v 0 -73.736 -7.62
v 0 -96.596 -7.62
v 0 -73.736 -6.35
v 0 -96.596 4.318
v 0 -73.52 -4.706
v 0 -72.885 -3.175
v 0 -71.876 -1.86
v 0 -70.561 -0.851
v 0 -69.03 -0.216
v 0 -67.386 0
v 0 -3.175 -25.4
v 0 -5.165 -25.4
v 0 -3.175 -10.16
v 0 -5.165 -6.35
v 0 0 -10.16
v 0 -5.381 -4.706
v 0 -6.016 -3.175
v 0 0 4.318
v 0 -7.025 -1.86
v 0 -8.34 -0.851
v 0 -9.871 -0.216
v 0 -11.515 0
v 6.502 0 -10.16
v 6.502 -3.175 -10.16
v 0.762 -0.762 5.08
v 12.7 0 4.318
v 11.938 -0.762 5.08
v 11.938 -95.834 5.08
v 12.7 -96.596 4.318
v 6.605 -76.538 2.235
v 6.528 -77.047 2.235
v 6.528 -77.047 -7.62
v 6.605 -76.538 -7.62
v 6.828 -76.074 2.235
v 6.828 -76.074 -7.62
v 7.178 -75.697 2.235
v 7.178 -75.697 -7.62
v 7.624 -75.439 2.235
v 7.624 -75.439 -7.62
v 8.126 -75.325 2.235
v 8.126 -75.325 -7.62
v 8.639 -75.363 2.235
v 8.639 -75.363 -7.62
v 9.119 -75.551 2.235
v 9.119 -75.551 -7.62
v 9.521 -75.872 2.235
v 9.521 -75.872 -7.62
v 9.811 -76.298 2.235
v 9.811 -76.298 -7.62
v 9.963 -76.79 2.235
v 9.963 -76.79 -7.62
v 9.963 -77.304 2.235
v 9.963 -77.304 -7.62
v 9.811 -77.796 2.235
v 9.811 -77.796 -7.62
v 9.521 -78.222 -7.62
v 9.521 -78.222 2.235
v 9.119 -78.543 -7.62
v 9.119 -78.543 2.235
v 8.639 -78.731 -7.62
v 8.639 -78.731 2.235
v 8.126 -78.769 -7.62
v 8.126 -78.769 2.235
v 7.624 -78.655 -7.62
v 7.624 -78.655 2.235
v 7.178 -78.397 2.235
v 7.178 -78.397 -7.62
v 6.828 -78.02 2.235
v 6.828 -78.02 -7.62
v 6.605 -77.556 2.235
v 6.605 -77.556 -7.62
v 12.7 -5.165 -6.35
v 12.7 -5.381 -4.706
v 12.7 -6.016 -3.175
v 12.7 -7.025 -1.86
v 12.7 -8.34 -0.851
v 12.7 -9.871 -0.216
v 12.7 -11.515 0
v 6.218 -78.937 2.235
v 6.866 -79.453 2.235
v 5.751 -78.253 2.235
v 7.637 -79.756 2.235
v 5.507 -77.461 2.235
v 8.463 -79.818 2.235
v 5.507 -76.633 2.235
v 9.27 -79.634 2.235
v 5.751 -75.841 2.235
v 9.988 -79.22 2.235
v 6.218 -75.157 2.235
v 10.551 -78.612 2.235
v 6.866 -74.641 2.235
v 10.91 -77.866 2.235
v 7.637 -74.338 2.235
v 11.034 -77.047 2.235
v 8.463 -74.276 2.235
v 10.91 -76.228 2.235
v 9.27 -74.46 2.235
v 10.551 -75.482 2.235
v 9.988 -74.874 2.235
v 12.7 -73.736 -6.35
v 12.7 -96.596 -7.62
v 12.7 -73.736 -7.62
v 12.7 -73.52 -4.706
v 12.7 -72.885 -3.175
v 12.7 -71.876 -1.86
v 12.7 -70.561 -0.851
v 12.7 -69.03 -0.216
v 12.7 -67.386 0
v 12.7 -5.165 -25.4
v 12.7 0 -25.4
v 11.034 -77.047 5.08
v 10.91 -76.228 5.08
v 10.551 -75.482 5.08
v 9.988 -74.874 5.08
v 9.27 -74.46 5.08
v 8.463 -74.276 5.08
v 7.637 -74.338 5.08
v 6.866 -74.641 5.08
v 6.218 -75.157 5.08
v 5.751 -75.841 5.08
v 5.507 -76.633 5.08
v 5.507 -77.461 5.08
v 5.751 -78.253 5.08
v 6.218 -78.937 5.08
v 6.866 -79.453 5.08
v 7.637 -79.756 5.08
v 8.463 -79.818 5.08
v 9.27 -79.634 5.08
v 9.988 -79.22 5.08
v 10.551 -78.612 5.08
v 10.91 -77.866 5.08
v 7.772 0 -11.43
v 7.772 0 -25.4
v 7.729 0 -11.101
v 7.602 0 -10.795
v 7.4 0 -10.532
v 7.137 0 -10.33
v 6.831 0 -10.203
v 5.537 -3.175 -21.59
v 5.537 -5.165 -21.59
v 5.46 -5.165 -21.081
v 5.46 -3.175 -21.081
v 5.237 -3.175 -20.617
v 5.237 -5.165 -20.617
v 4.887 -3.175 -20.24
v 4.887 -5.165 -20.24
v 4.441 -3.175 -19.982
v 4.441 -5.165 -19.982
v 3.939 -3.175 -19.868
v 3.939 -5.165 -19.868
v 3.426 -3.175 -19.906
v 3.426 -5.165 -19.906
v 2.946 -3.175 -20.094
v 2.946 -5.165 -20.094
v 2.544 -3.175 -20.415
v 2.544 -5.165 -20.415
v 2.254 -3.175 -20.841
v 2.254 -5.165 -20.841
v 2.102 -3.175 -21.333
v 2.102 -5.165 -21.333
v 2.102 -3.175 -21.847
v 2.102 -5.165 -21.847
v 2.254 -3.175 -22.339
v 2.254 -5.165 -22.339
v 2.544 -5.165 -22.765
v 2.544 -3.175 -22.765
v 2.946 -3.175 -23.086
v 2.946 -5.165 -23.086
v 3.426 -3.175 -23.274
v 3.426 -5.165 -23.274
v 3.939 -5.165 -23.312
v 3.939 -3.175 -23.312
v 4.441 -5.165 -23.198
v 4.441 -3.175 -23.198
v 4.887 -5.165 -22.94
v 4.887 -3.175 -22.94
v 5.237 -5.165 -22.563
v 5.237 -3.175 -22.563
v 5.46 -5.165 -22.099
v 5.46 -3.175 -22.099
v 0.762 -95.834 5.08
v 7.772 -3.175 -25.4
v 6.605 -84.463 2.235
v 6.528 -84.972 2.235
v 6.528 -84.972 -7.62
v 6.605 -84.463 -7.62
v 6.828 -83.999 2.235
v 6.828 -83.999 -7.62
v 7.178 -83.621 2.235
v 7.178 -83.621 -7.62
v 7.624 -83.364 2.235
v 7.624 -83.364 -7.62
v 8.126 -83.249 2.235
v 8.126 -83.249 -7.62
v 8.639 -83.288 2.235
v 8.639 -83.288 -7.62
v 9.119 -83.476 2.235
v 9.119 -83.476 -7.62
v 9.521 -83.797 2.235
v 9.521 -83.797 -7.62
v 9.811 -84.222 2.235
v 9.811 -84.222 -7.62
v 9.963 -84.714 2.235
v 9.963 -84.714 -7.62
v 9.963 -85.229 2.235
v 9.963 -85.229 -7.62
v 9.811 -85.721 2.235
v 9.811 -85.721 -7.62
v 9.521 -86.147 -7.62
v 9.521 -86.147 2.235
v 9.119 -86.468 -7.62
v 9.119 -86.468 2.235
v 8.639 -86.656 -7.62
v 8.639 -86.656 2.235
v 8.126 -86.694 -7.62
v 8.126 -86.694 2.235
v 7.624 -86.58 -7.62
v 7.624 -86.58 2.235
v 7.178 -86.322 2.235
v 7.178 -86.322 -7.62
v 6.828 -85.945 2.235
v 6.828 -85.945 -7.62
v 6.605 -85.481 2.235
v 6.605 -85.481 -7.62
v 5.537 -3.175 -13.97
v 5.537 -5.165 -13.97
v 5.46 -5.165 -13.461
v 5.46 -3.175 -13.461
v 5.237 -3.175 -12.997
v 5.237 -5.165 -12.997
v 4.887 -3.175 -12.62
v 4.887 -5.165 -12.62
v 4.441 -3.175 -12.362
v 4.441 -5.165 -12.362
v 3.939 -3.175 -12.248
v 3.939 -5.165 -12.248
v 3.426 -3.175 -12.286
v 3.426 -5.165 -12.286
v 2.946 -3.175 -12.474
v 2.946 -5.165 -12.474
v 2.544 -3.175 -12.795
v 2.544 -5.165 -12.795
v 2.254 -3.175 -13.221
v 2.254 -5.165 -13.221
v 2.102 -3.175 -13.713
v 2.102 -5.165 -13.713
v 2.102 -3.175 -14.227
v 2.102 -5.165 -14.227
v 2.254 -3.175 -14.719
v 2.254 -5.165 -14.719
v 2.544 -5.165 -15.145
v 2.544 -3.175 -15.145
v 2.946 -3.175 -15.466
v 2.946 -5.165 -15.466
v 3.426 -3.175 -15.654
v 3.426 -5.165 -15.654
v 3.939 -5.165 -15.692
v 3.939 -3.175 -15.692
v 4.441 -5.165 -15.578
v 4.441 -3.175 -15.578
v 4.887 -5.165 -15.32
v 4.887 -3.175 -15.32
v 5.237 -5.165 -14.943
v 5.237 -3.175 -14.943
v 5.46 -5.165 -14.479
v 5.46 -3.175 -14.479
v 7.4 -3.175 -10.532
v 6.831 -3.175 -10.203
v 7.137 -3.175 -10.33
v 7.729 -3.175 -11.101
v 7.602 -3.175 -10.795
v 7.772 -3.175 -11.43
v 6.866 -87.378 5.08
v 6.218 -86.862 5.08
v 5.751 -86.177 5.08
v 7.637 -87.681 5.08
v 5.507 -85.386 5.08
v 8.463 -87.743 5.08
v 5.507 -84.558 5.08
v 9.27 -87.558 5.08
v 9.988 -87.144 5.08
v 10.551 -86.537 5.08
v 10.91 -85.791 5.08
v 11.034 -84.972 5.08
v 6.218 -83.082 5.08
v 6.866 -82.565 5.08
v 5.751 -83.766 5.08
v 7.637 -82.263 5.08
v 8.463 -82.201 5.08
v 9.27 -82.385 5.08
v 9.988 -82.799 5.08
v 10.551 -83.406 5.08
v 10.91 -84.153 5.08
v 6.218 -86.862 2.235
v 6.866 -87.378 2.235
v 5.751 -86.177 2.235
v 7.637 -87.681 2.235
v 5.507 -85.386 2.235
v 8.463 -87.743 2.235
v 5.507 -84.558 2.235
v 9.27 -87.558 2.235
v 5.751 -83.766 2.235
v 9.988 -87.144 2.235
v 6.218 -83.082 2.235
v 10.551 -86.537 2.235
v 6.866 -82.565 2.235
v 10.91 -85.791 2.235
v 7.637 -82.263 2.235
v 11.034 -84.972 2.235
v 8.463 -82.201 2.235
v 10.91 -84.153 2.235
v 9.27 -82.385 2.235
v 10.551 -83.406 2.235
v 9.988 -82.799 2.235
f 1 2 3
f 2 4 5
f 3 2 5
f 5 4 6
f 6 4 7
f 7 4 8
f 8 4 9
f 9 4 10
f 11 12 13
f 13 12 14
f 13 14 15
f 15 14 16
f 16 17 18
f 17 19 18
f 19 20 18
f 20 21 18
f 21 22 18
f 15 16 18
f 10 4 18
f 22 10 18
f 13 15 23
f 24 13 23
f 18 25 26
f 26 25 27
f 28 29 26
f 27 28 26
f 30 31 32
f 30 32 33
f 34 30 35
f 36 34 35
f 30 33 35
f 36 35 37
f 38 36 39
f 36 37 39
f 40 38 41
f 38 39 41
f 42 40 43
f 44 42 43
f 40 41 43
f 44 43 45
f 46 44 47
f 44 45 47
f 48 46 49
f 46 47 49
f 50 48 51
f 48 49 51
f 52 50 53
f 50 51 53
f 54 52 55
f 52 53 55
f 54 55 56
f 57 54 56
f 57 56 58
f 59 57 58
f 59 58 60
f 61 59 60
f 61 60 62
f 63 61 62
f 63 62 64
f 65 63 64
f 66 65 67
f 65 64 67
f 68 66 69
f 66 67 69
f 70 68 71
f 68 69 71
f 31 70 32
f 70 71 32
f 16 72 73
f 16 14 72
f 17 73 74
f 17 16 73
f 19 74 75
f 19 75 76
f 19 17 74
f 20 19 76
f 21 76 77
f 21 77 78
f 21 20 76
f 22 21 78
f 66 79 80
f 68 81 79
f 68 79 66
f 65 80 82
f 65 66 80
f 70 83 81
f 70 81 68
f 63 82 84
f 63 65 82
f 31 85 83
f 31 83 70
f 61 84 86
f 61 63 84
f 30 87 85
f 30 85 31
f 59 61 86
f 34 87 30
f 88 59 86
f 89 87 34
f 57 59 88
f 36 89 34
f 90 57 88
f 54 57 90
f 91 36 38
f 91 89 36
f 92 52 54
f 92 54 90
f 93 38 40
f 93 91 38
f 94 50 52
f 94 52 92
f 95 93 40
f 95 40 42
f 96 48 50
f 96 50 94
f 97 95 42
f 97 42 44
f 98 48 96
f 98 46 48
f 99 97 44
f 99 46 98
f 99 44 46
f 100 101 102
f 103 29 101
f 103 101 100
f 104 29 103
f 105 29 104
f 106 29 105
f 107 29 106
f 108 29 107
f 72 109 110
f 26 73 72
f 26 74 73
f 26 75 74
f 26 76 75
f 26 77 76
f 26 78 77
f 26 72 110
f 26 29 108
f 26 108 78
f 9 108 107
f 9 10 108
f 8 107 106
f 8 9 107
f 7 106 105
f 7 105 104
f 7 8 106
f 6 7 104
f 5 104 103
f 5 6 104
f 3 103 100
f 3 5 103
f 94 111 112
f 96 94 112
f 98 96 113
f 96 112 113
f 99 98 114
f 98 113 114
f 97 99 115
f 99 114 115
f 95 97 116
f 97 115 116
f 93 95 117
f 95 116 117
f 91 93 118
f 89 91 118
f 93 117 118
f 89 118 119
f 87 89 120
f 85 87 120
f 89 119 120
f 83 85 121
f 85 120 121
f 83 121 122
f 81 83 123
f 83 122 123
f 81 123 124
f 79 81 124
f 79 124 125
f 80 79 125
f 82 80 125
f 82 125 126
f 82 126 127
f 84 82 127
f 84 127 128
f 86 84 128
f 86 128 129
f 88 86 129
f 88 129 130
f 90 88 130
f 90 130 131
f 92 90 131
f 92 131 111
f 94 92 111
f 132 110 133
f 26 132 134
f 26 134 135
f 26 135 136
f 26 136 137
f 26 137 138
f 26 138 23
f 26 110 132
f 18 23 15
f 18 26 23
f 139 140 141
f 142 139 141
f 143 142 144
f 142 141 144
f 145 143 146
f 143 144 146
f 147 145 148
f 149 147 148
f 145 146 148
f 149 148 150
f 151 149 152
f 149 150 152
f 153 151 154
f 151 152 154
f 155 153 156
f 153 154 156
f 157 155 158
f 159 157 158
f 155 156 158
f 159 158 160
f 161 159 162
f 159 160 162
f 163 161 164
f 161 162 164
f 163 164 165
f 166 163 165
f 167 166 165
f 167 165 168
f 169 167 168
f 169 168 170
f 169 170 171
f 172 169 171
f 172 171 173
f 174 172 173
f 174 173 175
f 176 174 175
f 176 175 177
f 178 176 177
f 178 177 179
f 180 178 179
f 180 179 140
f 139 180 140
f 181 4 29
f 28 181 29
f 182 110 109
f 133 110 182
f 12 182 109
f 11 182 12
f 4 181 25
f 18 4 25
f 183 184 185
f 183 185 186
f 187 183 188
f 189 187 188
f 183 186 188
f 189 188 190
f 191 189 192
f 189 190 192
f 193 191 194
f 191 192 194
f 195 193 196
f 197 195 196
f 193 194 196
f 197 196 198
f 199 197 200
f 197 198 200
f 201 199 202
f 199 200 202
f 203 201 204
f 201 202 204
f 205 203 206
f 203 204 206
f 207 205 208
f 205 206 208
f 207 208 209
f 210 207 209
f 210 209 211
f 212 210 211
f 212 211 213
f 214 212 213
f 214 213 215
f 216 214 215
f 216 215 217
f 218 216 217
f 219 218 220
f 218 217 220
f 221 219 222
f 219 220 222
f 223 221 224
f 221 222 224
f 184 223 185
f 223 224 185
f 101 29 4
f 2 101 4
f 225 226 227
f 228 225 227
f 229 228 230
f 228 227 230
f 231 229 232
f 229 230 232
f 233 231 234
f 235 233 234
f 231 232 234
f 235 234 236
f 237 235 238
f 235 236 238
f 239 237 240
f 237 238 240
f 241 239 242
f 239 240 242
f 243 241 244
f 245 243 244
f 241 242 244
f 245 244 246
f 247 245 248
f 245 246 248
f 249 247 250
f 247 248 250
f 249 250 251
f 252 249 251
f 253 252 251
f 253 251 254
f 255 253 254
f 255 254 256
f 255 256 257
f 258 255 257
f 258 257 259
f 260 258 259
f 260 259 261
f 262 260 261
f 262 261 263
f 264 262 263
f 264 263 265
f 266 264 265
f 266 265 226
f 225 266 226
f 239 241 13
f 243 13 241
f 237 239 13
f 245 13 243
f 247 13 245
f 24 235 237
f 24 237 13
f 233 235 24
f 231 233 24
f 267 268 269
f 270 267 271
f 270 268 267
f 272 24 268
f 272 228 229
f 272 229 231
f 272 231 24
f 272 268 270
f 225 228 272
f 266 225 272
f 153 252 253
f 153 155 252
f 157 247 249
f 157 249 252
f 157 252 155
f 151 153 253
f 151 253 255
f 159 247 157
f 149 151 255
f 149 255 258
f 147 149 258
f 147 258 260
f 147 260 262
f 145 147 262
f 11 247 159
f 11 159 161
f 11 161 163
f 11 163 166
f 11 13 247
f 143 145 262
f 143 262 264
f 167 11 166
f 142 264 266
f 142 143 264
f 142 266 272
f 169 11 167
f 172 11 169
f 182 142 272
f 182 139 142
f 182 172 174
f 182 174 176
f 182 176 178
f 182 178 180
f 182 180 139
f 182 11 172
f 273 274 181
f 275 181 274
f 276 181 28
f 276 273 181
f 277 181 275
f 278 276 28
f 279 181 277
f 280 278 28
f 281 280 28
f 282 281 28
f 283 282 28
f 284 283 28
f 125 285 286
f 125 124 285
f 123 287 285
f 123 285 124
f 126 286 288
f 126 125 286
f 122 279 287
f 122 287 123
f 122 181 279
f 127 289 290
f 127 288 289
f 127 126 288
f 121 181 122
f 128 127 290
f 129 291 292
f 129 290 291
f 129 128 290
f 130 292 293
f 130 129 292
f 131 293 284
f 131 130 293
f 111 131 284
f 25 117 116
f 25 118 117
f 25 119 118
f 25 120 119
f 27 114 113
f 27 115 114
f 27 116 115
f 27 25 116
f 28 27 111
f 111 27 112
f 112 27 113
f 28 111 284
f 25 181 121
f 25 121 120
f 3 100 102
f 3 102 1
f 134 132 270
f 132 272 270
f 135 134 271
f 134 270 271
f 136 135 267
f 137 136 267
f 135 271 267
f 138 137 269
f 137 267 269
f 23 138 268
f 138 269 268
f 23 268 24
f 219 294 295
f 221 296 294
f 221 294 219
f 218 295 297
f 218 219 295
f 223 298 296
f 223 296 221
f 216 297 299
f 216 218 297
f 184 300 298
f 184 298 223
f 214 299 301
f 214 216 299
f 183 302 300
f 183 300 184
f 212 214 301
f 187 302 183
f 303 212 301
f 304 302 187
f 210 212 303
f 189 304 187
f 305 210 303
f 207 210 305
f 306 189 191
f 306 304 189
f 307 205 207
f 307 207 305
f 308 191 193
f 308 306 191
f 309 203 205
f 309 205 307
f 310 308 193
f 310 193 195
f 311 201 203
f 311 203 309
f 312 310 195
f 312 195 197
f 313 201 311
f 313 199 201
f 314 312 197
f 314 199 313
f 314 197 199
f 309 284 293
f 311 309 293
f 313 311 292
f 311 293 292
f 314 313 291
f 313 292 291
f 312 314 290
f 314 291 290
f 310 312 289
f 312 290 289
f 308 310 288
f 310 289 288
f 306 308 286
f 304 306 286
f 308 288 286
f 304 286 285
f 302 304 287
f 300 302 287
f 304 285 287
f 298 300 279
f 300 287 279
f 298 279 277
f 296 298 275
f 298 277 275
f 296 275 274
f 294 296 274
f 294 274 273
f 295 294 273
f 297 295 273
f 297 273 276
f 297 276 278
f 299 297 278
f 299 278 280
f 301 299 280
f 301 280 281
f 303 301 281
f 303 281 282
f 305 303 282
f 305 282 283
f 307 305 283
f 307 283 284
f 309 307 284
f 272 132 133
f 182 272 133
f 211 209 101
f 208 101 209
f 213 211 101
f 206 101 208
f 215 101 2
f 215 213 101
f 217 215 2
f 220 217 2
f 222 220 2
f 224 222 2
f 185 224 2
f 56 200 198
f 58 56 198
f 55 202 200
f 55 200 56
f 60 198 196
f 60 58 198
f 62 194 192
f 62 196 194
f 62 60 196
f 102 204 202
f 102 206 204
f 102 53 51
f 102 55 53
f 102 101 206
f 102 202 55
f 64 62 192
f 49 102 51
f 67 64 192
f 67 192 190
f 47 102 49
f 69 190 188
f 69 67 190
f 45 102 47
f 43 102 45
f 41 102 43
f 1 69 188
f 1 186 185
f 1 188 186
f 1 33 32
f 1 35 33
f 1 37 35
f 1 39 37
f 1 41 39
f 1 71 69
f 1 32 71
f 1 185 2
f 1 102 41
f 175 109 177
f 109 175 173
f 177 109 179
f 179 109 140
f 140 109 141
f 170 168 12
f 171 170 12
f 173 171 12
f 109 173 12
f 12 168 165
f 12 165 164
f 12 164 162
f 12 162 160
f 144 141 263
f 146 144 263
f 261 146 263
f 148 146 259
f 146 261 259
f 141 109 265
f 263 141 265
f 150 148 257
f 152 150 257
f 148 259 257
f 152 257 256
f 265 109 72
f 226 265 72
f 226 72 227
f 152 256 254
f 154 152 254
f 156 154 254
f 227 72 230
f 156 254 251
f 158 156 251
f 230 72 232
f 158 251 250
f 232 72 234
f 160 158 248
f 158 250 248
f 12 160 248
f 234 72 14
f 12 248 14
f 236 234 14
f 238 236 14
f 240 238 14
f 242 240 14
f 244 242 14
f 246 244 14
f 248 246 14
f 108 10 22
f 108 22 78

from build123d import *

# Parameters (mm, degrees)
SKETCH1_W                                      = 12.7
SKETCH1_H                                      = 96.5962
EXTRUDE1_DEPTH                                 = 5.08
SKETCH2_W                                      = 12.7
SKETCH2_H                                      = 5.16498089
EXTRUDE2_DEPTH                                 = 25.4
F_4_CLEARANCE_HOLE1_D                          = 3.4544
SKETCH6_W                                      = 12.7
SKETCH6_H                                      = 22.86
EXTRUDE4_DEPTH                                 = 7.62
SKETCH7_W                                      = 7.9248
SKETCH7_H                                      = 15.24
EXTRUDE5_DEPTH                                 = 3.175
FILLET1_R                                      = 1.27
FILLET3_R                                      = 6.35
CHAMFER1_SIZE                                  = 0.762
CBORE_FOR_4_SOCKET_HEAD_CAP_SCREW1_D           = 3.4544
CBORE_FOR_4_SOCKET_HEAD_CAP_SCREW1_CBORE_D     = 5.55752
CBORE_FOR_4_SOCKET_HEAD_CAP_SCREW1_CBORE_DEPTH = 2.8448


with BuildPart() as part:
    # Sketch1 → Extrude1 (new body)
    with BuildSketch(Plane.XY):
        with Locations((6.35, -48.2981)):
            Rectangle(SKETCH1_W, SKETCH1_H)
    extrude(amount=EXTRUDE1_DEPTH)

    # Sketch2 → Extrude2 (add)
    with BuildSketch(Plane(origin=(0, 0, 0), x_dir=(-1, 0, 0), z_dir=(0, 0, -1))):
        with Locations((-6.35, -2.582490445)):
            Rectangle(SKETCH2_W, SKETCH2_H)
    extrude(amount=EXTRUDE2_DEPTH)

    # #4 Clearance Hole1 (through all)
    with Locations(Plane(origin=(0, 0, 0), x_dir=(-1, 0, 0), z_dir=(0, 1, 0))):
        with Locations((-3.81, -21.59), (-3.81, -13.97)):
            Hole(F_4_CLEARANCE_HOLE1_D / 2)

    # Sketch6 → Extrude4 (add)
    with BuildSketch(Plane(origin=(0, 0, 0), x_dir=(-1, 0, 0), z_dir=(0, 0, -1))):
        with Locations((-6.35, -85.1662)):
            Rectangle(SKETCH6_W, SKETCH6_H)
    extrude(amount=EXTRUDE4_DEPTH)

    # Sketch7 → Extrude5 (cut)
    with BuildSketch(Plane(origin=(0, 0, 0), x_dir=(1, 0, 0), z_dir=(0, 1, 0))):
        with Locations((3.81, 17.78)):
            Rectangle(SKETCH7_W, SKETCH7_H)
    extrude(amount=-EXTRUDE5_DEPTH, mode=Mode.SUBTRACT)

    # Fillet1
    fillet1_edges = [part.edges().sort_by_distance(p)[0] for p in [
        (7.7724, -1.5875, -10.16),
    ]]
    fillet(fillet1_edges, radius=FILLET1_R)

    # Fillet3
    fillet3_edges = [part.edges().sort_by_distance(p)[0] for p in [
        (6.35, -5.16498089, 0),
        (6.35, -73.7362, 0),
    ]]
    fillet(fillet3_edges, radius=FILLET3_R)

    # Chamfer1
    chamfer1_edges = [part.edges().sort_by_distance(p)[0] for p in [
        (12.7, -48.2981, 5.08),
        (6.35, 0, 5.08),
        (0, -48.2981, 5.08),
        (6.35, -96.5962, 5.08),
    ]]
    chamfer(chamfer1_edges, length=CHAMFER1_SIZE)

    # CBORE for #4 Socket Head Cap Screw1 (through all)
    with Locations(Plane.XY.offset(5.08)):
        with Locations((8.255, -84.97178089), (8.255, -77.04698089)):
            CounterBoreHole(CBORE_FOR_4_SOCKET_HEAD_CAP_SCREW1_D / 2, CBORE_FOR_4_SOCKET_HEAD_CAP_SCREW1_CBORE_D / 2, CBORE_FOR_4_SOCKET_HEAD_CAP_SCREW1_CBORE_DEPTH)


solid = part.part
